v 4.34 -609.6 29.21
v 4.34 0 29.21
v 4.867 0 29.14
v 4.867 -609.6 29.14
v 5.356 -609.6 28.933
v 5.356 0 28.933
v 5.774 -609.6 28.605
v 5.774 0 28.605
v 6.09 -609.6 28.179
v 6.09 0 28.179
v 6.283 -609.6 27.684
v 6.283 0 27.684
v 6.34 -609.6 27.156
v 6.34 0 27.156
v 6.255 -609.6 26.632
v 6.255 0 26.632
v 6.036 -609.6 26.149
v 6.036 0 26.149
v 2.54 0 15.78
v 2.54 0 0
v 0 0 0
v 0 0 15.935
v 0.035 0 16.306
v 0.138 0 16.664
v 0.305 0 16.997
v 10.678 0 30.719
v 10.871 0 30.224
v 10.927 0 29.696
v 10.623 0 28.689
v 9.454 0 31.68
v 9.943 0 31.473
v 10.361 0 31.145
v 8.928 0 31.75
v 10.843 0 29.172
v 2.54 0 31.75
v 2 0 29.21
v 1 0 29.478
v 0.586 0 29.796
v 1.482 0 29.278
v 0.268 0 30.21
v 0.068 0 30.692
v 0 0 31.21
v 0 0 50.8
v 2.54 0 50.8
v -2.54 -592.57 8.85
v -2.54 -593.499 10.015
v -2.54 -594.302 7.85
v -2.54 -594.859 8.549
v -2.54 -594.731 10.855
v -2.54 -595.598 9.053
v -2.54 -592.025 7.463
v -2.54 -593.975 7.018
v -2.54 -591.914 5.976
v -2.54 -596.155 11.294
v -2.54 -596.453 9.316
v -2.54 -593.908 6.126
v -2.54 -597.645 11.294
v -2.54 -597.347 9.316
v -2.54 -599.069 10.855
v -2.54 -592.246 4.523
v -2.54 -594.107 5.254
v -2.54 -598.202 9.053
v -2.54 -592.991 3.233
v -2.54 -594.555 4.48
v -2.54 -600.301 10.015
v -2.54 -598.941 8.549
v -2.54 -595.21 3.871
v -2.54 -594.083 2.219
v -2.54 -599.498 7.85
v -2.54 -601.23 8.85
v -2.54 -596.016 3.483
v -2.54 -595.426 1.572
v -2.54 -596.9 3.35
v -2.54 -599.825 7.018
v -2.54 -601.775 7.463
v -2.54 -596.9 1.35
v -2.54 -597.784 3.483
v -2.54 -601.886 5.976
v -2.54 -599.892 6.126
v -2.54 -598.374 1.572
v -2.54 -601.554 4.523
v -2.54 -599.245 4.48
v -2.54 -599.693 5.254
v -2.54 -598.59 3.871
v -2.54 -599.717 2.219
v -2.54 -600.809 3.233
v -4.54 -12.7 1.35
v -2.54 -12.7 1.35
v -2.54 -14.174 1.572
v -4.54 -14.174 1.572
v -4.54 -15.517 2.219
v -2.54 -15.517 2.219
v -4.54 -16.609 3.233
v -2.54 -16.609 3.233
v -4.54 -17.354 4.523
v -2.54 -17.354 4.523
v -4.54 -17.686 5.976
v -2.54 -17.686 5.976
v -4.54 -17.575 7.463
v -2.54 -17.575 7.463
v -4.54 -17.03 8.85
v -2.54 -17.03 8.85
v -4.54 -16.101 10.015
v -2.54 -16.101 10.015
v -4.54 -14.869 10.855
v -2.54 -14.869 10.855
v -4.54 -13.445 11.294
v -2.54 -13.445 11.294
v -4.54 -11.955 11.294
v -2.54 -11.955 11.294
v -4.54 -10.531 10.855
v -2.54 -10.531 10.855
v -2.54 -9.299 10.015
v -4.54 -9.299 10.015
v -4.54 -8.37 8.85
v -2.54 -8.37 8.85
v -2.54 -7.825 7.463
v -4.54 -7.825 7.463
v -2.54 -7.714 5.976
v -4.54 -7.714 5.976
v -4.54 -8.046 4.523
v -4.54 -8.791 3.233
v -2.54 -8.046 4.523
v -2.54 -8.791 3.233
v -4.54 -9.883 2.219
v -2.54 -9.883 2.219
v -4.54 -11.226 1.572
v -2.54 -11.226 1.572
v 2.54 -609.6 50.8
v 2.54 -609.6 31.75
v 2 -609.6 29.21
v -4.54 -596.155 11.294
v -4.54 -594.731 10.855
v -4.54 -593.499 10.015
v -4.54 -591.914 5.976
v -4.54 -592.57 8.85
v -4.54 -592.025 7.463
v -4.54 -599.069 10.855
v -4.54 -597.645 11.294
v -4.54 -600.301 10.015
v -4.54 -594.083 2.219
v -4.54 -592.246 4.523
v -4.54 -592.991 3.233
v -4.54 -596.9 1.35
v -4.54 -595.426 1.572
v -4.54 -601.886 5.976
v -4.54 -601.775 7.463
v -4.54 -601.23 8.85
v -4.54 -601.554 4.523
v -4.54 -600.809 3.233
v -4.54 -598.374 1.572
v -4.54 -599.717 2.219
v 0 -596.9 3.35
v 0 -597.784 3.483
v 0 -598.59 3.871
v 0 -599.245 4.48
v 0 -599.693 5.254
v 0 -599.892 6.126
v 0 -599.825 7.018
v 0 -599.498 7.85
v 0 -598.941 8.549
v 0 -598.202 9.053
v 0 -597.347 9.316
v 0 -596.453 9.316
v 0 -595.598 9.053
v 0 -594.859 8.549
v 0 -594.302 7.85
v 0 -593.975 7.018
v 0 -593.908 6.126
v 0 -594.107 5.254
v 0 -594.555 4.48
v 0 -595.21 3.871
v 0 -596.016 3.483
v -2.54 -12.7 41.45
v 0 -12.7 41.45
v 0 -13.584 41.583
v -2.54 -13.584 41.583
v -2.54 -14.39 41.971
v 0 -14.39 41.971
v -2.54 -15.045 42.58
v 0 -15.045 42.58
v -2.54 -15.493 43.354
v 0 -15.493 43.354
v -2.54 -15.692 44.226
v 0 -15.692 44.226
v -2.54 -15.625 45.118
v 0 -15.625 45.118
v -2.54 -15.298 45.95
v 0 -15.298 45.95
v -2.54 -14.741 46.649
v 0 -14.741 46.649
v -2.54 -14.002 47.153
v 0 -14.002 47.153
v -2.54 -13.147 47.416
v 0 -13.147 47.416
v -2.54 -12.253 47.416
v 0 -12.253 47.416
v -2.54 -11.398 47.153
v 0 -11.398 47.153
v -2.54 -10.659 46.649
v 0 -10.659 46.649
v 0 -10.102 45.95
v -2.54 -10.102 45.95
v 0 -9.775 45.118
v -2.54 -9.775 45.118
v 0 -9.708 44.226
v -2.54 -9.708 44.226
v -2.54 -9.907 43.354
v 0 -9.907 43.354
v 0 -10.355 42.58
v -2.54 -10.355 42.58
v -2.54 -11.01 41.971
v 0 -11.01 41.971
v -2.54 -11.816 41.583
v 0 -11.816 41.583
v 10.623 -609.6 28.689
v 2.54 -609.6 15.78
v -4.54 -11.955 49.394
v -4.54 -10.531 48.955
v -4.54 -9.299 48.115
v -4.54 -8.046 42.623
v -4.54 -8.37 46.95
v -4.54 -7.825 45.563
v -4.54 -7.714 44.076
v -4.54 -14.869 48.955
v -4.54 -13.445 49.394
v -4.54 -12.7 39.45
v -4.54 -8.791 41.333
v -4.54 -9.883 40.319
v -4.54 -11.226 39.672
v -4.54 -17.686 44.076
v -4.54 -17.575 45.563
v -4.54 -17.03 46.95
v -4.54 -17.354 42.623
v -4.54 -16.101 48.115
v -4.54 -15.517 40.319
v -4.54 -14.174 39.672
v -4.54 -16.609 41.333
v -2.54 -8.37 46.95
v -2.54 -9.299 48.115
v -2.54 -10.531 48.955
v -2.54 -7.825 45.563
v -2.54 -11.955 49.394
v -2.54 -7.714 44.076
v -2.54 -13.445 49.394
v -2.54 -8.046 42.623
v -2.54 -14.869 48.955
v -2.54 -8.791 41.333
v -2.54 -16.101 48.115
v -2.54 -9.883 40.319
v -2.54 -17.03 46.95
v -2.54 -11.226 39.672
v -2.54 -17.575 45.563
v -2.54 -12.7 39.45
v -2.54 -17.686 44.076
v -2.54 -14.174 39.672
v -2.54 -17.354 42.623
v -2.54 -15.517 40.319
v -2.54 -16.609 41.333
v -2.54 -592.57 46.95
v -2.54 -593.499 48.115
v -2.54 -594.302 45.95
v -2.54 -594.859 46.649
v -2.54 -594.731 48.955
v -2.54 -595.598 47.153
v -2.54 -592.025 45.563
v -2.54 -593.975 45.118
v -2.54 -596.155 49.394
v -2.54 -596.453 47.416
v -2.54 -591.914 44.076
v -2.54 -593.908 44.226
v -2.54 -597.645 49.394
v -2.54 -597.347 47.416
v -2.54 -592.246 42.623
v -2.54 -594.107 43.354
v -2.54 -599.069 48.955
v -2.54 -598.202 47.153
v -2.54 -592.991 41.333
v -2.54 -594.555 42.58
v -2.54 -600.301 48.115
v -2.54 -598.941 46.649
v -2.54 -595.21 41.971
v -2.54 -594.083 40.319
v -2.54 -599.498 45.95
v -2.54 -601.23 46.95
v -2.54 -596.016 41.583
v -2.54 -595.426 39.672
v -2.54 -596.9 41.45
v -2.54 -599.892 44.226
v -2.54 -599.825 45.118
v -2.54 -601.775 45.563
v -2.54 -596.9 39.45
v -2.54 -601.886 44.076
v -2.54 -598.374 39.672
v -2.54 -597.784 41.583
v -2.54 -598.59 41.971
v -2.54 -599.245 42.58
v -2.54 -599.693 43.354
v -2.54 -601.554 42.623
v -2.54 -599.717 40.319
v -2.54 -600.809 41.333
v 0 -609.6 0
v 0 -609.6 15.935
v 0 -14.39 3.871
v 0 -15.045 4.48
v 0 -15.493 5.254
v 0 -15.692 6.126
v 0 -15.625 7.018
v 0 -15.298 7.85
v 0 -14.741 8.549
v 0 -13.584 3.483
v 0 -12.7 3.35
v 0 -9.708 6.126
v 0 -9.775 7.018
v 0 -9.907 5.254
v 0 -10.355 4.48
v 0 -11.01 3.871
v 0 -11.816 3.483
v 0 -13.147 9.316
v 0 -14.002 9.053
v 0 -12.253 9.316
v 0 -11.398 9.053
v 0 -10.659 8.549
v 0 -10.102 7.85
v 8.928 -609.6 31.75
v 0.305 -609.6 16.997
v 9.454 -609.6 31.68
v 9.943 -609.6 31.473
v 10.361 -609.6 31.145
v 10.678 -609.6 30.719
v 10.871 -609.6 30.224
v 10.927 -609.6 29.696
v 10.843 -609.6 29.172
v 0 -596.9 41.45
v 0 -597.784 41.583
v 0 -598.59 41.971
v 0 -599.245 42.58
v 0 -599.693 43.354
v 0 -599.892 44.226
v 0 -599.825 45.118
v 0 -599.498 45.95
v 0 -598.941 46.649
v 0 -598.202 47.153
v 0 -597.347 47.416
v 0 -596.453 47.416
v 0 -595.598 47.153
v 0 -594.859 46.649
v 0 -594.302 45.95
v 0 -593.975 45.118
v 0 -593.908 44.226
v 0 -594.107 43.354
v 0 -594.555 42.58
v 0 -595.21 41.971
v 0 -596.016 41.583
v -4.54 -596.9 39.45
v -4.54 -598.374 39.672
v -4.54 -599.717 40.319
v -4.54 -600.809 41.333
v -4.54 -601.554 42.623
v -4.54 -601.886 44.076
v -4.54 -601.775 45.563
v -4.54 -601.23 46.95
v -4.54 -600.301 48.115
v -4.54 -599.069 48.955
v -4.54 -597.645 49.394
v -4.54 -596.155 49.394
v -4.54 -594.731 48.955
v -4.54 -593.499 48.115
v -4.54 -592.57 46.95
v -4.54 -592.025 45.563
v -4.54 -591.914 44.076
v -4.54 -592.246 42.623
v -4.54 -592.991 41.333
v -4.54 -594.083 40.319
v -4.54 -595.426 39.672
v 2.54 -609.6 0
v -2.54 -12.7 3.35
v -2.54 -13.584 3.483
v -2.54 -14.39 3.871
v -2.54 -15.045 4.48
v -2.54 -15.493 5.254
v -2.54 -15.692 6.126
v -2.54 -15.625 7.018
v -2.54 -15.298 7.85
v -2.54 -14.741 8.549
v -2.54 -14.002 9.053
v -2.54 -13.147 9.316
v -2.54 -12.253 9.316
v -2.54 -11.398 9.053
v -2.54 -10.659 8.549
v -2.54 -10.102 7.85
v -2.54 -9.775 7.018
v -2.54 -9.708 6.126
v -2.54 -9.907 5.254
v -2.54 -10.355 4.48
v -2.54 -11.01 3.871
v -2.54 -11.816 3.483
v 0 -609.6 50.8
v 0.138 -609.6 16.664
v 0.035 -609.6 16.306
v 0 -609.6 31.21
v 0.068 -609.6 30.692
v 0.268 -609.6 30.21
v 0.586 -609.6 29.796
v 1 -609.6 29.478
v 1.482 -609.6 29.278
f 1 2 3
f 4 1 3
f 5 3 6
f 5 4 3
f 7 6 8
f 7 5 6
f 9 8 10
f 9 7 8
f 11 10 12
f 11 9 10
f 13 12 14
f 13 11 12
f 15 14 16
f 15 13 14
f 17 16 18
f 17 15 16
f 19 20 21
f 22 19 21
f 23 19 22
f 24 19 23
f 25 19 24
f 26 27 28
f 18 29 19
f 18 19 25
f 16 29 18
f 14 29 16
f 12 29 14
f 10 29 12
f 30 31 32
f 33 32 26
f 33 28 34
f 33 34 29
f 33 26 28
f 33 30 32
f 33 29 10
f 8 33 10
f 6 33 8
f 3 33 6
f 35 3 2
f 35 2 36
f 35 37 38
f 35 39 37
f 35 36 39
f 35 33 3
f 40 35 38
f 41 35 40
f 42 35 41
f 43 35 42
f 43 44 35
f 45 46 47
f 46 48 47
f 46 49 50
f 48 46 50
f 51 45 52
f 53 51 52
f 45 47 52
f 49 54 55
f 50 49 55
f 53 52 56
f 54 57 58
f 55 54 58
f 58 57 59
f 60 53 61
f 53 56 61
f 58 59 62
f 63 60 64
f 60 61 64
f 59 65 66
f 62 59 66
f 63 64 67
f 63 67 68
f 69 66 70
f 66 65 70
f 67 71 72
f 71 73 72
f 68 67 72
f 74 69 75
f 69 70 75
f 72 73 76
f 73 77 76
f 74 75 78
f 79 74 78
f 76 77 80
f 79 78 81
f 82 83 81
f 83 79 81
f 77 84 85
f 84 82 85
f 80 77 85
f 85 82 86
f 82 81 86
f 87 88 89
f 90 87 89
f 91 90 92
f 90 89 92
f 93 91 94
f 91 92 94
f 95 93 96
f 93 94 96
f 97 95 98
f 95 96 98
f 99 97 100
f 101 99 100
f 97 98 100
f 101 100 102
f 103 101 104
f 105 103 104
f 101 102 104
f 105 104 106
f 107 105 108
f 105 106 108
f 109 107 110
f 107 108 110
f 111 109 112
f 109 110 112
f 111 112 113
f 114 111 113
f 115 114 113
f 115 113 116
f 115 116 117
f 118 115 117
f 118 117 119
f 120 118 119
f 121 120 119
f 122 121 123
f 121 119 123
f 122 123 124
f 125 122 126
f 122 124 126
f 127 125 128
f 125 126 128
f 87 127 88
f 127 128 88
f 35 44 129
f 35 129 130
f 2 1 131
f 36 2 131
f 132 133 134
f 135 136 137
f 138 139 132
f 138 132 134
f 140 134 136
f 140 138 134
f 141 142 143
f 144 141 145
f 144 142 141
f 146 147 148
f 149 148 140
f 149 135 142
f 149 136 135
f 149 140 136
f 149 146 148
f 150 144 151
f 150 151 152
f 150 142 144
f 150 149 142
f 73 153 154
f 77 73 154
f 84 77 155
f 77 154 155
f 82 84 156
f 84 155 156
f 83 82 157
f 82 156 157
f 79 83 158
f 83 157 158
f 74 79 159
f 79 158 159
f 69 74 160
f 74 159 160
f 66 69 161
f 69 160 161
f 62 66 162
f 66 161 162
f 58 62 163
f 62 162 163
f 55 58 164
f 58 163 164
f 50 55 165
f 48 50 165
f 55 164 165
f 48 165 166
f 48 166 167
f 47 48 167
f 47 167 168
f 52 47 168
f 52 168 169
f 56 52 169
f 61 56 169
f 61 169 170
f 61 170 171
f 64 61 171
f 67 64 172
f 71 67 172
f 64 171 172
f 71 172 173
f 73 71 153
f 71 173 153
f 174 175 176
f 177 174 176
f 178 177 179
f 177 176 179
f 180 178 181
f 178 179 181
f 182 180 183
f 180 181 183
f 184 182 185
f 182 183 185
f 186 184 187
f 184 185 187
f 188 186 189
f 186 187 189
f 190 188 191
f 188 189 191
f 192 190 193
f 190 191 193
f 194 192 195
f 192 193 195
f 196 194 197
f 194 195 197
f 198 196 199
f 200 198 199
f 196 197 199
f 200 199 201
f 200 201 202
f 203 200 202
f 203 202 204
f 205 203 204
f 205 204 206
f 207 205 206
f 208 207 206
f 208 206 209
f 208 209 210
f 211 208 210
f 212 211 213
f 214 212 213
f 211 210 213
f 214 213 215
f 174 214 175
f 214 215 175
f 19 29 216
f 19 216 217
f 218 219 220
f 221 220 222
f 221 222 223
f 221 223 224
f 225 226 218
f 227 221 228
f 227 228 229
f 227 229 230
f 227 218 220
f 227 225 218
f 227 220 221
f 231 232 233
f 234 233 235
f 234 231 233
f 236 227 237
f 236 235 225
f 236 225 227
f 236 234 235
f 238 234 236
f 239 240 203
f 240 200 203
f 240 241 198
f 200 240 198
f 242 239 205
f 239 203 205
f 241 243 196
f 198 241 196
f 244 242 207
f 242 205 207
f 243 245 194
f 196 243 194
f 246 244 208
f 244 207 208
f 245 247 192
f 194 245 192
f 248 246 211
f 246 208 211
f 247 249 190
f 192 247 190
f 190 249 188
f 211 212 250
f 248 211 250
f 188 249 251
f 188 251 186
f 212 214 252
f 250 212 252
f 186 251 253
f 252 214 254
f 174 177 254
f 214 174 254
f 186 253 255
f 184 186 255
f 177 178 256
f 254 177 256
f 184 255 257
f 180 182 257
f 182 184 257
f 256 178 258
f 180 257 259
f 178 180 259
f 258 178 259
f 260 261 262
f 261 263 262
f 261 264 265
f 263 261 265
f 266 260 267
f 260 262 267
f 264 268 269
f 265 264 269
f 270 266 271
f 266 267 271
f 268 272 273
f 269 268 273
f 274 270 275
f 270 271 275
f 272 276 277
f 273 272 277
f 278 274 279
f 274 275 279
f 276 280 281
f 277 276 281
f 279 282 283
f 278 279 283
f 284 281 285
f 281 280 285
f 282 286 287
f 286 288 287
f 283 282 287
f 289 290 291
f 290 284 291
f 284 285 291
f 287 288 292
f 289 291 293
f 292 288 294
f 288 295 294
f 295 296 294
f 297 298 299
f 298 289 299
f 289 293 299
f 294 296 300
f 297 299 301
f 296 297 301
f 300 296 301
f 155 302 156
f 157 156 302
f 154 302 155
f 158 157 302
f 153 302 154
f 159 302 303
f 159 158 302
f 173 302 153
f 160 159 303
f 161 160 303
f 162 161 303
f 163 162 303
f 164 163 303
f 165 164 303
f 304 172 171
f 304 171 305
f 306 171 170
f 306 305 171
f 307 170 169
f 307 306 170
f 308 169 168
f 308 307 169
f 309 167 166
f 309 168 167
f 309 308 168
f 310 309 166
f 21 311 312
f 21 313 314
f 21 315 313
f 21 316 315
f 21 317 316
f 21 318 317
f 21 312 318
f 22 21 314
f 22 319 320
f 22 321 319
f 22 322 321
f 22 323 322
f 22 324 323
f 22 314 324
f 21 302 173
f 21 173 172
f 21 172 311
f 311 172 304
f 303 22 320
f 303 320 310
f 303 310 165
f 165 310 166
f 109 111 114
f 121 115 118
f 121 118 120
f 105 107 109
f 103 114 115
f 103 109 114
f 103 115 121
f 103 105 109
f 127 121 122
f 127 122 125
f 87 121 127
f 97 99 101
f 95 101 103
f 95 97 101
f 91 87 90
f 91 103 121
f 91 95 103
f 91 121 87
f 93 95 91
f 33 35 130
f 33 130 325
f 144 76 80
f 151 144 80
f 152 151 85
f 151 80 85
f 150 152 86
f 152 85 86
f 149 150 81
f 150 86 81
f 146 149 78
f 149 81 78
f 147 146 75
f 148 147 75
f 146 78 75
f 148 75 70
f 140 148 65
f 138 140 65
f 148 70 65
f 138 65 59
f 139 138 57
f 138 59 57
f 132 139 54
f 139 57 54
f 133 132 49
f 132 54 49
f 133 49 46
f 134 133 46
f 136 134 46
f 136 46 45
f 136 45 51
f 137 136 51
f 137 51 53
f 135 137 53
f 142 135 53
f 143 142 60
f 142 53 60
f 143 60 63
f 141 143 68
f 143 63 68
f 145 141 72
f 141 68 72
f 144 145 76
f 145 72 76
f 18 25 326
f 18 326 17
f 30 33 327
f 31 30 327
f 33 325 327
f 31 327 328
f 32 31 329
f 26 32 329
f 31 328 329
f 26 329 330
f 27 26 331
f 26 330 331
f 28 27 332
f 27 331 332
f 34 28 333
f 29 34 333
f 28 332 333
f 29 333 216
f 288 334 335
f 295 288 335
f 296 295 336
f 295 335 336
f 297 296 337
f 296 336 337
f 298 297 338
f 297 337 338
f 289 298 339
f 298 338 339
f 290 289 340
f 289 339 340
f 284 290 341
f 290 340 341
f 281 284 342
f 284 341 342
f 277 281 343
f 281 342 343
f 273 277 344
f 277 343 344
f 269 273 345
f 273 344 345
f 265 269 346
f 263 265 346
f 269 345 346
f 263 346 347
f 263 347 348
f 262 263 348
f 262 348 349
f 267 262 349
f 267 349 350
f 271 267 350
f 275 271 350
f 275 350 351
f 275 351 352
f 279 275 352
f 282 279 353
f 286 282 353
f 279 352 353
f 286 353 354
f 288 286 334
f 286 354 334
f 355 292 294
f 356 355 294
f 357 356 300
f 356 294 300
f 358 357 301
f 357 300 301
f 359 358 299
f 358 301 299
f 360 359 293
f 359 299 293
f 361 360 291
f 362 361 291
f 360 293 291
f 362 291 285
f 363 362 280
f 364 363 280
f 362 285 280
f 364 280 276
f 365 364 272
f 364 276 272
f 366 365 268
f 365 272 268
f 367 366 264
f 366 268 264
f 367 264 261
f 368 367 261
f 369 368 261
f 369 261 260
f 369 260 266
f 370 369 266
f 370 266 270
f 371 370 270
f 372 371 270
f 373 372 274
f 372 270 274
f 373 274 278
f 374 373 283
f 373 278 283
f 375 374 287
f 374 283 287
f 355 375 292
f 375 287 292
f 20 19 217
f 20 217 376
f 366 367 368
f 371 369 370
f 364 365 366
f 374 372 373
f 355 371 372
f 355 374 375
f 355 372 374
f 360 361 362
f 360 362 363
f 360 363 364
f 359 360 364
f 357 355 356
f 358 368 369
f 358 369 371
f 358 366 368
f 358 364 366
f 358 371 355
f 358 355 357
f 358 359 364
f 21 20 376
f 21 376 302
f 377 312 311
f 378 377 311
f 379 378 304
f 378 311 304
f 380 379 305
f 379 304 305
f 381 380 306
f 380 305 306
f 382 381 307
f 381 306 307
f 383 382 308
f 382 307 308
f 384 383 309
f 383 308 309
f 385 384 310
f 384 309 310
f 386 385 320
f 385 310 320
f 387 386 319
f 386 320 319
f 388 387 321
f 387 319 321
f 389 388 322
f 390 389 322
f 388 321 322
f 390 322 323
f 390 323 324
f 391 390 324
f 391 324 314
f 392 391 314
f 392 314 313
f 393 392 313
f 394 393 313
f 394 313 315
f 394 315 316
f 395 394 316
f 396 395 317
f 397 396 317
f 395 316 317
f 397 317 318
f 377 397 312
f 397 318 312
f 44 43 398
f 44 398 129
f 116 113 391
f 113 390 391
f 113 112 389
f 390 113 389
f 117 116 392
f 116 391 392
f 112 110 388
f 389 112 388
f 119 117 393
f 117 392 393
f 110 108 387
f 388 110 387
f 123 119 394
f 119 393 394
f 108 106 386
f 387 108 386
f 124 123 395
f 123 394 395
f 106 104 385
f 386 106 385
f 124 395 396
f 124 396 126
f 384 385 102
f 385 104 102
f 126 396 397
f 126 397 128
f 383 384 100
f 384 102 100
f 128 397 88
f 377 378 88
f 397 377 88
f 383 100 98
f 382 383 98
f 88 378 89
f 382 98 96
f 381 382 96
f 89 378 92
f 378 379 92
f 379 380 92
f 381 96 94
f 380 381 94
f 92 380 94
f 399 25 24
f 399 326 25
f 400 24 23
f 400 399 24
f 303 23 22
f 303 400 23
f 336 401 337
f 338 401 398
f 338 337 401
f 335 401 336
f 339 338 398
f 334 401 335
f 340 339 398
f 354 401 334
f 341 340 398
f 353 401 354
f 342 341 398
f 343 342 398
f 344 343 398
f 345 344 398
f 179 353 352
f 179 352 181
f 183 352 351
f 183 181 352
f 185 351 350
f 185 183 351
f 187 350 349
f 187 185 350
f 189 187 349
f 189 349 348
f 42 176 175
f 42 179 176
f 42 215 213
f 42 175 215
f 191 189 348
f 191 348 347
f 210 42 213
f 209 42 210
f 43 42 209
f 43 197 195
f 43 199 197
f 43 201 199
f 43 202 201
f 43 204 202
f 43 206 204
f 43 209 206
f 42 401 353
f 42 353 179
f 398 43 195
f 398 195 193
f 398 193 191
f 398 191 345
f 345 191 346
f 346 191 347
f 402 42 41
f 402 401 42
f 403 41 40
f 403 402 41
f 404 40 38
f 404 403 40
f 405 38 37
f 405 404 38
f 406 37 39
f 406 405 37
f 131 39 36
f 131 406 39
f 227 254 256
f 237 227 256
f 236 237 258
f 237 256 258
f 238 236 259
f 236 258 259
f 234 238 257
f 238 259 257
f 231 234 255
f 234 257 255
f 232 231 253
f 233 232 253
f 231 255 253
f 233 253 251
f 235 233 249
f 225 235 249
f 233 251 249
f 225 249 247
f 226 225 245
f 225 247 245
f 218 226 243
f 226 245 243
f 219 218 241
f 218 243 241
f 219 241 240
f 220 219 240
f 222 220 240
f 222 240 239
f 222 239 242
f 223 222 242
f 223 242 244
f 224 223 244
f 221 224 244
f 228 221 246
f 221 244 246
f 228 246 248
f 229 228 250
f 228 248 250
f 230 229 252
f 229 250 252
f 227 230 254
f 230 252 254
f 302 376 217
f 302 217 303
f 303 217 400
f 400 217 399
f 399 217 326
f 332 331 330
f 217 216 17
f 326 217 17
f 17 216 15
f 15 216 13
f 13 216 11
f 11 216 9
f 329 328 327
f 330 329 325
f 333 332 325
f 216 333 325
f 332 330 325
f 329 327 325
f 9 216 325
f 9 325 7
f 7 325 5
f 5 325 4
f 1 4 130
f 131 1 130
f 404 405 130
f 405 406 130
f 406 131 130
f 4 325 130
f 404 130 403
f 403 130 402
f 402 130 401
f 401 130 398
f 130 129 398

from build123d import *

# Parameters (mm, degrees)
PAD_DEPTH    = 609.6
SKETCH001_R  = 3
PAD001_DEPTH = 2.54
SKETCH002_R  = 5
PAD002_DEPTH = 2
FILLET_R     = 2


with BuildPart() as part:
    # Sketch → Pad (new body)
    with BuildSketch(Plane.XZ):
        Polygon((0, 0), (0, 16.51), (7.952592, 29.21), (0, 29.21), (0, 50.8), (2.54, 50.8), (2.54, 31.75), (12.54, 31.75), (2.54, 15.780364), (2.54, 0), align=None)
    extrude(amount=PAD_DEPTH)

    # Sketch001 (on Face4 of Pad) → Pad001 (join)
    with BuildSketch(Plane(origin=(0, 0, 0), x_dir=(0, 0, -1), z_dir=(-1, 0, 0))):
        with Locations((-44.45, 12.7)):
            Circle(SKETCH001_R)
        with Locations((-6.35, 12.7)):
            Circle(SKETCH001_R)
        with Locations((-44.45, 596.9)):
            Circle(SKETCH001_R)
        with Locations((-6.35, 596.9)):
            Circle(SKETCH001_R)
    extrude(amount=PAD001_DEPTH)

    # Sketch002 (on Face20 of Pad001) → Pad002 (join)
    with BuildSketch(Plane(origin=(-2.54, 0, 0), x_dir=(0, 0, -1), z_dir=(-1, 0, 0))):
        with Locations((-44.45, 12.7)):
            Circle(SKETCH002_R)
        with Locations((-6.35, 596.9)):
            Circle(SKETCH002_R)
        with Locations((-44.45, 596.9)):
            Circle(SKETCH002_R)
        with Locations((-6.35, 12.7)):
            Circle(SKETCH002_R)
    extrude(amount=PAD002_DEPTH)

    # Fillet
    fillet_edges = [part.edges().sort_by_distance(p)[0] for p in [
        (0, -304.8, 29.21),
        (0, -304.8, 16.51),
        (12.54, -304.8, 31.75),
        (7.952592, -304.8, 29.21),
    ]]
    fillet(fillet_edges, radius=FILLET_R)


solid = part.part
